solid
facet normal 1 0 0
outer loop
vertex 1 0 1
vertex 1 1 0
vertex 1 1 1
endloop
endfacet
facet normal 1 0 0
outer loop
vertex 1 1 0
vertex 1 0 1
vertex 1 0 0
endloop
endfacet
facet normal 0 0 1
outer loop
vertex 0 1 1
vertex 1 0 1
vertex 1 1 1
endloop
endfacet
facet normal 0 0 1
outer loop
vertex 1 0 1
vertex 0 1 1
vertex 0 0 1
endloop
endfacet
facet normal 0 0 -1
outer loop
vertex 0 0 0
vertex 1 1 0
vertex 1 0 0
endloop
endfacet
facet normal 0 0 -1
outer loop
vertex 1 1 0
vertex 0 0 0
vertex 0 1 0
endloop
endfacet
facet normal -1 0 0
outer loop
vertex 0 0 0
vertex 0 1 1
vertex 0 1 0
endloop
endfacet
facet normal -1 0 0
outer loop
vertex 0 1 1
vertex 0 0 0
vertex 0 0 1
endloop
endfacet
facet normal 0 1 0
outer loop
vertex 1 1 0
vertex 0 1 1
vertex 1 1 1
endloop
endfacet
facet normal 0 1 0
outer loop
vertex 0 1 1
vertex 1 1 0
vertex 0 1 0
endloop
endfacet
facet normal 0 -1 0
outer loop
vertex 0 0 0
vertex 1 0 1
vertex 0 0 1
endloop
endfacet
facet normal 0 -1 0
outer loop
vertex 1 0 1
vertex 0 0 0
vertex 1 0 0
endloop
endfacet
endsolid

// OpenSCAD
/*

* should 

*/

fancycap = false;
//todo: bonus X000 micron (X mm) filter for big chunks

$fa = .01;
$fs = 5;

//measurements
cone_folded_arc_angle = 105;
cone_slant_h = 120;
filter_slant_h = 43;

//design parameters
thin_wall_thickness = 2;
flow_gap = 3;
spout_id = 10;
cap_od = 52.6;

//shorthand
twt=thin_wall_thickness;

//calculated
cone_arc_angle = 2 * cone_folded_arc_angle;
cone_arc_length = 2 * PI * cone_arc_angle / 360 * cone_slant_h;
cone_r = (1/(2*PI)) * cone_arc_length;
cone_h = sqrt(cone_slant_h^2 - cone_r^2);
//cone_slope = cone_h/cone_r;

filter_h = filter_slant_h * (cone_h / cone_slant_h);
filter_r = filter_h * (cone_r / cone_h);


//todon't: this is good enough
module cap(fancy=!$preview){
	//from https://www.printables.com/model/215011-soda-bottle-funnel-cap-for-siraya-tech-resin-1-kg/files
	// if substituting your own,
	// position it so that the imaginary lip of the bottle
  // is	on the xy plane and centered around the z axis
	x_min=-13.59;
	y_min=-7.58;
	z_min=-.175;
	d = 54.53;
	d_narrow = cap_od;
	if(fancy){
		rotate([90,0,0])
			translate([x_min-.5*d,y_min,z_min-.5*d])
				import("basic_cap.stl", convexity=20);
	} else {
		difference(){
			translate([0,0,-19]) cylinder(h=21,d=d_narrow);
			translate([0,0,-20+.1])cylinder(h=20,r=25.5);
		}
	}
	

}

module funnel(){
	difference(){
		union(){
			//flow gap
			cylinder(h=cone_h-filter_h+flow_gap,r=filter_r+twt);
			translate([0,0,flow_gap+cone_h-filter_h]) cylinder(h=filter_h,r1=filter_r+twt, r2= twt);
			//funnel
			cylinder(h=cone_h, r1=cone_r + twt, r2 = twt);
			//spout
			cylinder(h=flow_gap+cone_h+99, d=spout_id+2*twt);
		}
		union(){
			//flow gap
			cylinder(h=cone_h-filter_h+flow_gap+.1,r=filter_r);
			#translate([0,0,flow_gap+cone_h-filter_h]) cylinder(h=filter_h,r1=filter_r, r2 = 0);
			//funnel
			translate([0,0,-.1]) cylinder(h=cone_h, r1=cone_r, r2 = 0);
			//spout
			cylinder(h=flow_gap+cone_h+99+.1, d=spout_id);
			
			translate([twt,0,cone_h+flow_gap]) hull(){
				translate([ cone_r,-50,-cone_h]) cube(100);
				translate([-cone_r,-50, cone_h]) cube(100);
			}
			//translate([0,0,cone_h]) rotate([30,0,0]) translate([0,0,50]) cube(100, center=true);
		}
	}
}

module hyperboloid(h, r0=cap_od/2, slope=cone_h/cone_r){
	/*
		xx/aa+yy/bb-zz/cc=1, asymptotic to xx/aa+yy/bb-zz/cc=0
		
		r^2/a^2-z^2/c^2=1; asymptotic to r^2/a^2-z^2/c^2=0;
		 asymptotic to r^2/a^2=z^2/c^2; or z/r=+/- c/a
		 
		 parametrezation over z
		 rr/aa=1+zz/cc
		 rr=aa+aazz/cc
		 r=sqrt(aa+aazz/cc)
		 
		 r=sqrt(r0^2+slope^-2*z^2)
	*/
	n=max(3,ceil(h*sqrt(1+slope^-2)/$fs));
	points = [[0,0],for(i=[0:n]) [sqrt(r0^2+(1/slope*h*i/n)^2),h*i/n],[0,h]];
	rotate_extrude() polygon(points);
}

module hyperboloid2(h, r0=cap_od/2, r1){
	/*
	r1=sqrt(r0^2+unslope^2*h^2)
	r1^2=r0^2+unslope^2*h^2
	(r1^2-r0^2)/h^2=unslope^2
	*/
	unslope=sqrt(r1^2-r0^2)/h;
	n=max(3,ceil(h*sqrt(1+unslope^2)/$fs));
	points = [[0,0],for(i=[0:n]) [sqrt(r0^2+(unslope*h*i/n)^2),h*i/n],[0,h]];
	rotate_extrude() polygon(points);
}

module hyperboloid3(h, r0, r1, thickness, num_legs, percent=.25){
	assert(r1>=r0);
	
	// reparamaterized such that f(..., t=1) = [_,_,h]
	function rule_line_point (alpha,t,a,b,c,h) = [a*cos(alpha),b*sin(alpha),0] +
		t*(h/c)*[-a*sin(alpha),b*cos(alpha),c];
	function inset_xy (point, inset) = 
		point - concat(inset * point.xy, [0]) / norm(point.xy);
	//function reversed(list) = [for (i=[1:len(list)]) list[len(list)-i]];
	
	
	
	unslope=sqrt(r1^2-r0^2)/h;
	
	a = r0;
	b = r0;
	c = a/unslope;
	
	/*
	ok so I want the 
	*/
	z_count=max(3,ceil(h*sqrt(1+unslope^2)/$fs));
	r_count = ceil(2*PI*r1/$fs/num_legs*percent);
	alpha_range = 360/num_legs*percent;
	
	points = [ for(t=[0:z_count-1],alpha=[0:r_count-1]) 
		rule_line_point(alpha/(r_count-1)*alpha_range,t/z_count,a,b,c,h)
	];
	points2 = [for (p=points) each [p, inset_xy(p, thickness)]];
	
	//each point is assigned a face except top points
	faces = [for(t=[0:z_count-2],alpha=[0:r_count-1])
		[
			t*r_count+alpha,
			r_count+((alpha+1)%r_count),
			(t+1)*r_count+alpha,
			(t+1)*r_count++((alpha+1)%r_count)
		]
	];
	polyhedron(points,faces);
	//for(p=points) translate(p) cube(3);
	cube();
}

!hyperboloid3(cone_h+flow_gap,cap_od/2,cone_r,5,5);

module main(){
	translate([0,0,cone_h+flow_gap]) mirror([0,0,1]) funnel();
	difference(){
		cap();
		//todo hardcoded
		cylinder(r=25.5-5,h=5);
	}
	%hyperboloid2(cone_h+flow_gap,cap_od/2,cone_r);
	%hyperboloid3(cone_h+flow_gap,cap_od/2,cone_r,5,5);
}

main();




echo([1,2,3]-[1]);
